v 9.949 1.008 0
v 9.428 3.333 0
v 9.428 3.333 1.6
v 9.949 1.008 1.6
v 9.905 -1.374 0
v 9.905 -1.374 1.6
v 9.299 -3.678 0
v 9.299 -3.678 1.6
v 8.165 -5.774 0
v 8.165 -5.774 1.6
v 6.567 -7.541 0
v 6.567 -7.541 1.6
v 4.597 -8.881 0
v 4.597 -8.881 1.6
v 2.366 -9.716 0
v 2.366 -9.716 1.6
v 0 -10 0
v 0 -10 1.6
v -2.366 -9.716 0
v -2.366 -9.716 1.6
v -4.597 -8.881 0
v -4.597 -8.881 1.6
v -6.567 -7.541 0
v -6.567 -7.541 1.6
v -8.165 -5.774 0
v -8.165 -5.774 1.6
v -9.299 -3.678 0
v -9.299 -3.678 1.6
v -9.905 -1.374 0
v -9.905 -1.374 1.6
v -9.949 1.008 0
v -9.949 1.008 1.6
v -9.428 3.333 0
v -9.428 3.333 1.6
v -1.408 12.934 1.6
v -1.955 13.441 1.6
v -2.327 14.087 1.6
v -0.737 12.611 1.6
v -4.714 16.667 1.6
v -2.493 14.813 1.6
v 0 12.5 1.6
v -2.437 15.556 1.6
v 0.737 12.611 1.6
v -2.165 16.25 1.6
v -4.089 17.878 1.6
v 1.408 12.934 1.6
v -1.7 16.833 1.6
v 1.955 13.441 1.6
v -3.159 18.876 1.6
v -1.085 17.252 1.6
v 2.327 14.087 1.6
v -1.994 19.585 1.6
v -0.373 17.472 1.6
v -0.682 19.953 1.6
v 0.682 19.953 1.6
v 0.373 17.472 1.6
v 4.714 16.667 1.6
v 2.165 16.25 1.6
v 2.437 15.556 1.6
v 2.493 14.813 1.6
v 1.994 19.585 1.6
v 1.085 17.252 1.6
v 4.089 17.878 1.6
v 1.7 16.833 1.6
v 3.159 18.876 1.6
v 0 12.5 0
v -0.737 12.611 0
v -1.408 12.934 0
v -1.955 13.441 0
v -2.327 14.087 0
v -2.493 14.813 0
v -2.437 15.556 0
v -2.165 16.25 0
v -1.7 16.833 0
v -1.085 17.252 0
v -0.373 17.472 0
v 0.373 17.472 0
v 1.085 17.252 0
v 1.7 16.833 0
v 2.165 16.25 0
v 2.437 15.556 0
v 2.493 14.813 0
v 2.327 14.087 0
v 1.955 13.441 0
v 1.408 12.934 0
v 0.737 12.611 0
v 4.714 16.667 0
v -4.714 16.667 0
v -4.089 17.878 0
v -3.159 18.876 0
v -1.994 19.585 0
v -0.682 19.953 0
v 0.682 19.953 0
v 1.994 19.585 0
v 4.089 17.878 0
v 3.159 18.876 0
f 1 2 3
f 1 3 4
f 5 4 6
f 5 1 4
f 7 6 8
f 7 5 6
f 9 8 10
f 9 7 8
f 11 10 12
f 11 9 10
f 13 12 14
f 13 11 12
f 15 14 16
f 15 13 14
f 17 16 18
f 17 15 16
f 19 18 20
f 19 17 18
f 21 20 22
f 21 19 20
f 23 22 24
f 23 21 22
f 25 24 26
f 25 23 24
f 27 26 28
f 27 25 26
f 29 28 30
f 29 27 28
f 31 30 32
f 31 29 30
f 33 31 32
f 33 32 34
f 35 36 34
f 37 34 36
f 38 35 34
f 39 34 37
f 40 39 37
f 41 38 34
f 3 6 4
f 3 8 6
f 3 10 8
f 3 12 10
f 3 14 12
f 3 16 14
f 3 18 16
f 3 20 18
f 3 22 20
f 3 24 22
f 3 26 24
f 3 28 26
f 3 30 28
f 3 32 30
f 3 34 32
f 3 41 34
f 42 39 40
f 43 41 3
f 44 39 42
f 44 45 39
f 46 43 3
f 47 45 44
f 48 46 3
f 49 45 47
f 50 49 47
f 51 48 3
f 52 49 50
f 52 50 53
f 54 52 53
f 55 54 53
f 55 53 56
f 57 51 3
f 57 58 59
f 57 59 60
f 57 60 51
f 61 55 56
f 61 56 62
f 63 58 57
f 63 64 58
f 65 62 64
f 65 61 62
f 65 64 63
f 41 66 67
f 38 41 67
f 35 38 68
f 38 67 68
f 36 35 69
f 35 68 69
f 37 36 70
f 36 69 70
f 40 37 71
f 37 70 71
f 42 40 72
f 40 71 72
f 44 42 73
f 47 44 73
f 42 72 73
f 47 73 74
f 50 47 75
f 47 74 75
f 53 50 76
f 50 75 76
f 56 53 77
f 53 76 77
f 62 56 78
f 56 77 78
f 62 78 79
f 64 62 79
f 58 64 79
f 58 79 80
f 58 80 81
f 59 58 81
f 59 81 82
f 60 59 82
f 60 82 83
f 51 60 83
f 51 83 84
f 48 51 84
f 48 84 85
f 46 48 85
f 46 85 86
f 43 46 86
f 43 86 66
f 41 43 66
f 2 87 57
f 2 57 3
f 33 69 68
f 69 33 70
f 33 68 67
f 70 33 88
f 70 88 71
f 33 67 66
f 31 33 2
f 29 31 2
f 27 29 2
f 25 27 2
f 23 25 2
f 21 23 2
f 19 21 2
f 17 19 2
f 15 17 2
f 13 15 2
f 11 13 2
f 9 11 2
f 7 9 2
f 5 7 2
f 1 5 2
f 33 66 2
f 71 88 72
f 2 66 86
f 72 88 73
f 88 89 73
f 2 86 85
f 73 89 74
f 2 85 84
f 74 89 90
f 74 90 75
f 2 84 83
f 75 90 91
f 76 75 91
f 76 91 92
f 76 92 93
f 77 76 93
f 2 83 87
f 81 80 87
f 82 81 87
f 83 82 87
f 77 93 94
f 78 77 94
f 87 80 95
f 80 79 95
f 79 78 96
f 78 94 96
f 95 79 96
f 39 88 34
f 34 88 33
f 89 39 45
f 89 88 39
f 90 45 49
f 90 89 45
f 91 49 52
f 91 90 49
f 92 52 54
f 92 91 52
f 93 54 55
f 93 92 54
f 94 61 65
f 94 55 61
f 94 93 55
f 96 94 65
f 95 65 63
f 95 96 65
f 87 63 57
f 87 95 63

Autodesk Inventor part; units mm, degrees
ref_plane "YZ Plane" through (0, 0, 0) normal (1, 0, 0) x (0, 1, 0)
ref_plane "XZ Plane" through (0, 0, 0) normal (0, 1, 0) x (-1, 0, 0)
ref_plane "XY Plane" through (0, 0, 0) normal (0, 0, 1) x (1, 0, 0)
sketch "Sketch1" plane through (0, 0, 0) normal (0, 0, 1) x (1, 0, 0)
  circle A0 centre (0, 0) radius 10
  circle A1 centre (0, 15) radius 5
  line L0 (0, 0) -> (0, 15)
  line L1 (-4.714, 16.6667) -> (-9.4281, 3.3333)
  line L2 (4.714, 16.6667) -> (9.4281, 3.3333)
  dimension "d0" = 20
  dimension "d1" = 10
extrude "Extrusion1" add sketch "Sketch1" along normal blind 1.6
sketch "Sketch2" plane through (0, 0, 1.6) normal (0, 0, 1) x (1, 0, 0)
  arc A0 (-9.4281, 3.3333) -> (9.4281, 3.3333) centre (0, 0) ccw projected
  line L0 (9.4281, 3.3333) -> (4.714, 16.6667) projected
  arc A1 (4.714, 16.6667) -> (-4.714, 16.6667) centre (0, 15) ccw projected
  line L1 (-4.714, 16.6667) -> (-9.4281, 3.3333) projected
hole "Hole1" at (0, 15, 1.6) direction (0, 0, -1) diameter 5 end through all
sketch "Sketch3" plane through (0, 0, 1.6) normal (0, 0, 1) x (1, 0, 0)
  circle A0 centre (0, 15) radius 2.5 projected
  point P0 (0, 0)
properties part number "Key Fob" material "ABS Plastic"
